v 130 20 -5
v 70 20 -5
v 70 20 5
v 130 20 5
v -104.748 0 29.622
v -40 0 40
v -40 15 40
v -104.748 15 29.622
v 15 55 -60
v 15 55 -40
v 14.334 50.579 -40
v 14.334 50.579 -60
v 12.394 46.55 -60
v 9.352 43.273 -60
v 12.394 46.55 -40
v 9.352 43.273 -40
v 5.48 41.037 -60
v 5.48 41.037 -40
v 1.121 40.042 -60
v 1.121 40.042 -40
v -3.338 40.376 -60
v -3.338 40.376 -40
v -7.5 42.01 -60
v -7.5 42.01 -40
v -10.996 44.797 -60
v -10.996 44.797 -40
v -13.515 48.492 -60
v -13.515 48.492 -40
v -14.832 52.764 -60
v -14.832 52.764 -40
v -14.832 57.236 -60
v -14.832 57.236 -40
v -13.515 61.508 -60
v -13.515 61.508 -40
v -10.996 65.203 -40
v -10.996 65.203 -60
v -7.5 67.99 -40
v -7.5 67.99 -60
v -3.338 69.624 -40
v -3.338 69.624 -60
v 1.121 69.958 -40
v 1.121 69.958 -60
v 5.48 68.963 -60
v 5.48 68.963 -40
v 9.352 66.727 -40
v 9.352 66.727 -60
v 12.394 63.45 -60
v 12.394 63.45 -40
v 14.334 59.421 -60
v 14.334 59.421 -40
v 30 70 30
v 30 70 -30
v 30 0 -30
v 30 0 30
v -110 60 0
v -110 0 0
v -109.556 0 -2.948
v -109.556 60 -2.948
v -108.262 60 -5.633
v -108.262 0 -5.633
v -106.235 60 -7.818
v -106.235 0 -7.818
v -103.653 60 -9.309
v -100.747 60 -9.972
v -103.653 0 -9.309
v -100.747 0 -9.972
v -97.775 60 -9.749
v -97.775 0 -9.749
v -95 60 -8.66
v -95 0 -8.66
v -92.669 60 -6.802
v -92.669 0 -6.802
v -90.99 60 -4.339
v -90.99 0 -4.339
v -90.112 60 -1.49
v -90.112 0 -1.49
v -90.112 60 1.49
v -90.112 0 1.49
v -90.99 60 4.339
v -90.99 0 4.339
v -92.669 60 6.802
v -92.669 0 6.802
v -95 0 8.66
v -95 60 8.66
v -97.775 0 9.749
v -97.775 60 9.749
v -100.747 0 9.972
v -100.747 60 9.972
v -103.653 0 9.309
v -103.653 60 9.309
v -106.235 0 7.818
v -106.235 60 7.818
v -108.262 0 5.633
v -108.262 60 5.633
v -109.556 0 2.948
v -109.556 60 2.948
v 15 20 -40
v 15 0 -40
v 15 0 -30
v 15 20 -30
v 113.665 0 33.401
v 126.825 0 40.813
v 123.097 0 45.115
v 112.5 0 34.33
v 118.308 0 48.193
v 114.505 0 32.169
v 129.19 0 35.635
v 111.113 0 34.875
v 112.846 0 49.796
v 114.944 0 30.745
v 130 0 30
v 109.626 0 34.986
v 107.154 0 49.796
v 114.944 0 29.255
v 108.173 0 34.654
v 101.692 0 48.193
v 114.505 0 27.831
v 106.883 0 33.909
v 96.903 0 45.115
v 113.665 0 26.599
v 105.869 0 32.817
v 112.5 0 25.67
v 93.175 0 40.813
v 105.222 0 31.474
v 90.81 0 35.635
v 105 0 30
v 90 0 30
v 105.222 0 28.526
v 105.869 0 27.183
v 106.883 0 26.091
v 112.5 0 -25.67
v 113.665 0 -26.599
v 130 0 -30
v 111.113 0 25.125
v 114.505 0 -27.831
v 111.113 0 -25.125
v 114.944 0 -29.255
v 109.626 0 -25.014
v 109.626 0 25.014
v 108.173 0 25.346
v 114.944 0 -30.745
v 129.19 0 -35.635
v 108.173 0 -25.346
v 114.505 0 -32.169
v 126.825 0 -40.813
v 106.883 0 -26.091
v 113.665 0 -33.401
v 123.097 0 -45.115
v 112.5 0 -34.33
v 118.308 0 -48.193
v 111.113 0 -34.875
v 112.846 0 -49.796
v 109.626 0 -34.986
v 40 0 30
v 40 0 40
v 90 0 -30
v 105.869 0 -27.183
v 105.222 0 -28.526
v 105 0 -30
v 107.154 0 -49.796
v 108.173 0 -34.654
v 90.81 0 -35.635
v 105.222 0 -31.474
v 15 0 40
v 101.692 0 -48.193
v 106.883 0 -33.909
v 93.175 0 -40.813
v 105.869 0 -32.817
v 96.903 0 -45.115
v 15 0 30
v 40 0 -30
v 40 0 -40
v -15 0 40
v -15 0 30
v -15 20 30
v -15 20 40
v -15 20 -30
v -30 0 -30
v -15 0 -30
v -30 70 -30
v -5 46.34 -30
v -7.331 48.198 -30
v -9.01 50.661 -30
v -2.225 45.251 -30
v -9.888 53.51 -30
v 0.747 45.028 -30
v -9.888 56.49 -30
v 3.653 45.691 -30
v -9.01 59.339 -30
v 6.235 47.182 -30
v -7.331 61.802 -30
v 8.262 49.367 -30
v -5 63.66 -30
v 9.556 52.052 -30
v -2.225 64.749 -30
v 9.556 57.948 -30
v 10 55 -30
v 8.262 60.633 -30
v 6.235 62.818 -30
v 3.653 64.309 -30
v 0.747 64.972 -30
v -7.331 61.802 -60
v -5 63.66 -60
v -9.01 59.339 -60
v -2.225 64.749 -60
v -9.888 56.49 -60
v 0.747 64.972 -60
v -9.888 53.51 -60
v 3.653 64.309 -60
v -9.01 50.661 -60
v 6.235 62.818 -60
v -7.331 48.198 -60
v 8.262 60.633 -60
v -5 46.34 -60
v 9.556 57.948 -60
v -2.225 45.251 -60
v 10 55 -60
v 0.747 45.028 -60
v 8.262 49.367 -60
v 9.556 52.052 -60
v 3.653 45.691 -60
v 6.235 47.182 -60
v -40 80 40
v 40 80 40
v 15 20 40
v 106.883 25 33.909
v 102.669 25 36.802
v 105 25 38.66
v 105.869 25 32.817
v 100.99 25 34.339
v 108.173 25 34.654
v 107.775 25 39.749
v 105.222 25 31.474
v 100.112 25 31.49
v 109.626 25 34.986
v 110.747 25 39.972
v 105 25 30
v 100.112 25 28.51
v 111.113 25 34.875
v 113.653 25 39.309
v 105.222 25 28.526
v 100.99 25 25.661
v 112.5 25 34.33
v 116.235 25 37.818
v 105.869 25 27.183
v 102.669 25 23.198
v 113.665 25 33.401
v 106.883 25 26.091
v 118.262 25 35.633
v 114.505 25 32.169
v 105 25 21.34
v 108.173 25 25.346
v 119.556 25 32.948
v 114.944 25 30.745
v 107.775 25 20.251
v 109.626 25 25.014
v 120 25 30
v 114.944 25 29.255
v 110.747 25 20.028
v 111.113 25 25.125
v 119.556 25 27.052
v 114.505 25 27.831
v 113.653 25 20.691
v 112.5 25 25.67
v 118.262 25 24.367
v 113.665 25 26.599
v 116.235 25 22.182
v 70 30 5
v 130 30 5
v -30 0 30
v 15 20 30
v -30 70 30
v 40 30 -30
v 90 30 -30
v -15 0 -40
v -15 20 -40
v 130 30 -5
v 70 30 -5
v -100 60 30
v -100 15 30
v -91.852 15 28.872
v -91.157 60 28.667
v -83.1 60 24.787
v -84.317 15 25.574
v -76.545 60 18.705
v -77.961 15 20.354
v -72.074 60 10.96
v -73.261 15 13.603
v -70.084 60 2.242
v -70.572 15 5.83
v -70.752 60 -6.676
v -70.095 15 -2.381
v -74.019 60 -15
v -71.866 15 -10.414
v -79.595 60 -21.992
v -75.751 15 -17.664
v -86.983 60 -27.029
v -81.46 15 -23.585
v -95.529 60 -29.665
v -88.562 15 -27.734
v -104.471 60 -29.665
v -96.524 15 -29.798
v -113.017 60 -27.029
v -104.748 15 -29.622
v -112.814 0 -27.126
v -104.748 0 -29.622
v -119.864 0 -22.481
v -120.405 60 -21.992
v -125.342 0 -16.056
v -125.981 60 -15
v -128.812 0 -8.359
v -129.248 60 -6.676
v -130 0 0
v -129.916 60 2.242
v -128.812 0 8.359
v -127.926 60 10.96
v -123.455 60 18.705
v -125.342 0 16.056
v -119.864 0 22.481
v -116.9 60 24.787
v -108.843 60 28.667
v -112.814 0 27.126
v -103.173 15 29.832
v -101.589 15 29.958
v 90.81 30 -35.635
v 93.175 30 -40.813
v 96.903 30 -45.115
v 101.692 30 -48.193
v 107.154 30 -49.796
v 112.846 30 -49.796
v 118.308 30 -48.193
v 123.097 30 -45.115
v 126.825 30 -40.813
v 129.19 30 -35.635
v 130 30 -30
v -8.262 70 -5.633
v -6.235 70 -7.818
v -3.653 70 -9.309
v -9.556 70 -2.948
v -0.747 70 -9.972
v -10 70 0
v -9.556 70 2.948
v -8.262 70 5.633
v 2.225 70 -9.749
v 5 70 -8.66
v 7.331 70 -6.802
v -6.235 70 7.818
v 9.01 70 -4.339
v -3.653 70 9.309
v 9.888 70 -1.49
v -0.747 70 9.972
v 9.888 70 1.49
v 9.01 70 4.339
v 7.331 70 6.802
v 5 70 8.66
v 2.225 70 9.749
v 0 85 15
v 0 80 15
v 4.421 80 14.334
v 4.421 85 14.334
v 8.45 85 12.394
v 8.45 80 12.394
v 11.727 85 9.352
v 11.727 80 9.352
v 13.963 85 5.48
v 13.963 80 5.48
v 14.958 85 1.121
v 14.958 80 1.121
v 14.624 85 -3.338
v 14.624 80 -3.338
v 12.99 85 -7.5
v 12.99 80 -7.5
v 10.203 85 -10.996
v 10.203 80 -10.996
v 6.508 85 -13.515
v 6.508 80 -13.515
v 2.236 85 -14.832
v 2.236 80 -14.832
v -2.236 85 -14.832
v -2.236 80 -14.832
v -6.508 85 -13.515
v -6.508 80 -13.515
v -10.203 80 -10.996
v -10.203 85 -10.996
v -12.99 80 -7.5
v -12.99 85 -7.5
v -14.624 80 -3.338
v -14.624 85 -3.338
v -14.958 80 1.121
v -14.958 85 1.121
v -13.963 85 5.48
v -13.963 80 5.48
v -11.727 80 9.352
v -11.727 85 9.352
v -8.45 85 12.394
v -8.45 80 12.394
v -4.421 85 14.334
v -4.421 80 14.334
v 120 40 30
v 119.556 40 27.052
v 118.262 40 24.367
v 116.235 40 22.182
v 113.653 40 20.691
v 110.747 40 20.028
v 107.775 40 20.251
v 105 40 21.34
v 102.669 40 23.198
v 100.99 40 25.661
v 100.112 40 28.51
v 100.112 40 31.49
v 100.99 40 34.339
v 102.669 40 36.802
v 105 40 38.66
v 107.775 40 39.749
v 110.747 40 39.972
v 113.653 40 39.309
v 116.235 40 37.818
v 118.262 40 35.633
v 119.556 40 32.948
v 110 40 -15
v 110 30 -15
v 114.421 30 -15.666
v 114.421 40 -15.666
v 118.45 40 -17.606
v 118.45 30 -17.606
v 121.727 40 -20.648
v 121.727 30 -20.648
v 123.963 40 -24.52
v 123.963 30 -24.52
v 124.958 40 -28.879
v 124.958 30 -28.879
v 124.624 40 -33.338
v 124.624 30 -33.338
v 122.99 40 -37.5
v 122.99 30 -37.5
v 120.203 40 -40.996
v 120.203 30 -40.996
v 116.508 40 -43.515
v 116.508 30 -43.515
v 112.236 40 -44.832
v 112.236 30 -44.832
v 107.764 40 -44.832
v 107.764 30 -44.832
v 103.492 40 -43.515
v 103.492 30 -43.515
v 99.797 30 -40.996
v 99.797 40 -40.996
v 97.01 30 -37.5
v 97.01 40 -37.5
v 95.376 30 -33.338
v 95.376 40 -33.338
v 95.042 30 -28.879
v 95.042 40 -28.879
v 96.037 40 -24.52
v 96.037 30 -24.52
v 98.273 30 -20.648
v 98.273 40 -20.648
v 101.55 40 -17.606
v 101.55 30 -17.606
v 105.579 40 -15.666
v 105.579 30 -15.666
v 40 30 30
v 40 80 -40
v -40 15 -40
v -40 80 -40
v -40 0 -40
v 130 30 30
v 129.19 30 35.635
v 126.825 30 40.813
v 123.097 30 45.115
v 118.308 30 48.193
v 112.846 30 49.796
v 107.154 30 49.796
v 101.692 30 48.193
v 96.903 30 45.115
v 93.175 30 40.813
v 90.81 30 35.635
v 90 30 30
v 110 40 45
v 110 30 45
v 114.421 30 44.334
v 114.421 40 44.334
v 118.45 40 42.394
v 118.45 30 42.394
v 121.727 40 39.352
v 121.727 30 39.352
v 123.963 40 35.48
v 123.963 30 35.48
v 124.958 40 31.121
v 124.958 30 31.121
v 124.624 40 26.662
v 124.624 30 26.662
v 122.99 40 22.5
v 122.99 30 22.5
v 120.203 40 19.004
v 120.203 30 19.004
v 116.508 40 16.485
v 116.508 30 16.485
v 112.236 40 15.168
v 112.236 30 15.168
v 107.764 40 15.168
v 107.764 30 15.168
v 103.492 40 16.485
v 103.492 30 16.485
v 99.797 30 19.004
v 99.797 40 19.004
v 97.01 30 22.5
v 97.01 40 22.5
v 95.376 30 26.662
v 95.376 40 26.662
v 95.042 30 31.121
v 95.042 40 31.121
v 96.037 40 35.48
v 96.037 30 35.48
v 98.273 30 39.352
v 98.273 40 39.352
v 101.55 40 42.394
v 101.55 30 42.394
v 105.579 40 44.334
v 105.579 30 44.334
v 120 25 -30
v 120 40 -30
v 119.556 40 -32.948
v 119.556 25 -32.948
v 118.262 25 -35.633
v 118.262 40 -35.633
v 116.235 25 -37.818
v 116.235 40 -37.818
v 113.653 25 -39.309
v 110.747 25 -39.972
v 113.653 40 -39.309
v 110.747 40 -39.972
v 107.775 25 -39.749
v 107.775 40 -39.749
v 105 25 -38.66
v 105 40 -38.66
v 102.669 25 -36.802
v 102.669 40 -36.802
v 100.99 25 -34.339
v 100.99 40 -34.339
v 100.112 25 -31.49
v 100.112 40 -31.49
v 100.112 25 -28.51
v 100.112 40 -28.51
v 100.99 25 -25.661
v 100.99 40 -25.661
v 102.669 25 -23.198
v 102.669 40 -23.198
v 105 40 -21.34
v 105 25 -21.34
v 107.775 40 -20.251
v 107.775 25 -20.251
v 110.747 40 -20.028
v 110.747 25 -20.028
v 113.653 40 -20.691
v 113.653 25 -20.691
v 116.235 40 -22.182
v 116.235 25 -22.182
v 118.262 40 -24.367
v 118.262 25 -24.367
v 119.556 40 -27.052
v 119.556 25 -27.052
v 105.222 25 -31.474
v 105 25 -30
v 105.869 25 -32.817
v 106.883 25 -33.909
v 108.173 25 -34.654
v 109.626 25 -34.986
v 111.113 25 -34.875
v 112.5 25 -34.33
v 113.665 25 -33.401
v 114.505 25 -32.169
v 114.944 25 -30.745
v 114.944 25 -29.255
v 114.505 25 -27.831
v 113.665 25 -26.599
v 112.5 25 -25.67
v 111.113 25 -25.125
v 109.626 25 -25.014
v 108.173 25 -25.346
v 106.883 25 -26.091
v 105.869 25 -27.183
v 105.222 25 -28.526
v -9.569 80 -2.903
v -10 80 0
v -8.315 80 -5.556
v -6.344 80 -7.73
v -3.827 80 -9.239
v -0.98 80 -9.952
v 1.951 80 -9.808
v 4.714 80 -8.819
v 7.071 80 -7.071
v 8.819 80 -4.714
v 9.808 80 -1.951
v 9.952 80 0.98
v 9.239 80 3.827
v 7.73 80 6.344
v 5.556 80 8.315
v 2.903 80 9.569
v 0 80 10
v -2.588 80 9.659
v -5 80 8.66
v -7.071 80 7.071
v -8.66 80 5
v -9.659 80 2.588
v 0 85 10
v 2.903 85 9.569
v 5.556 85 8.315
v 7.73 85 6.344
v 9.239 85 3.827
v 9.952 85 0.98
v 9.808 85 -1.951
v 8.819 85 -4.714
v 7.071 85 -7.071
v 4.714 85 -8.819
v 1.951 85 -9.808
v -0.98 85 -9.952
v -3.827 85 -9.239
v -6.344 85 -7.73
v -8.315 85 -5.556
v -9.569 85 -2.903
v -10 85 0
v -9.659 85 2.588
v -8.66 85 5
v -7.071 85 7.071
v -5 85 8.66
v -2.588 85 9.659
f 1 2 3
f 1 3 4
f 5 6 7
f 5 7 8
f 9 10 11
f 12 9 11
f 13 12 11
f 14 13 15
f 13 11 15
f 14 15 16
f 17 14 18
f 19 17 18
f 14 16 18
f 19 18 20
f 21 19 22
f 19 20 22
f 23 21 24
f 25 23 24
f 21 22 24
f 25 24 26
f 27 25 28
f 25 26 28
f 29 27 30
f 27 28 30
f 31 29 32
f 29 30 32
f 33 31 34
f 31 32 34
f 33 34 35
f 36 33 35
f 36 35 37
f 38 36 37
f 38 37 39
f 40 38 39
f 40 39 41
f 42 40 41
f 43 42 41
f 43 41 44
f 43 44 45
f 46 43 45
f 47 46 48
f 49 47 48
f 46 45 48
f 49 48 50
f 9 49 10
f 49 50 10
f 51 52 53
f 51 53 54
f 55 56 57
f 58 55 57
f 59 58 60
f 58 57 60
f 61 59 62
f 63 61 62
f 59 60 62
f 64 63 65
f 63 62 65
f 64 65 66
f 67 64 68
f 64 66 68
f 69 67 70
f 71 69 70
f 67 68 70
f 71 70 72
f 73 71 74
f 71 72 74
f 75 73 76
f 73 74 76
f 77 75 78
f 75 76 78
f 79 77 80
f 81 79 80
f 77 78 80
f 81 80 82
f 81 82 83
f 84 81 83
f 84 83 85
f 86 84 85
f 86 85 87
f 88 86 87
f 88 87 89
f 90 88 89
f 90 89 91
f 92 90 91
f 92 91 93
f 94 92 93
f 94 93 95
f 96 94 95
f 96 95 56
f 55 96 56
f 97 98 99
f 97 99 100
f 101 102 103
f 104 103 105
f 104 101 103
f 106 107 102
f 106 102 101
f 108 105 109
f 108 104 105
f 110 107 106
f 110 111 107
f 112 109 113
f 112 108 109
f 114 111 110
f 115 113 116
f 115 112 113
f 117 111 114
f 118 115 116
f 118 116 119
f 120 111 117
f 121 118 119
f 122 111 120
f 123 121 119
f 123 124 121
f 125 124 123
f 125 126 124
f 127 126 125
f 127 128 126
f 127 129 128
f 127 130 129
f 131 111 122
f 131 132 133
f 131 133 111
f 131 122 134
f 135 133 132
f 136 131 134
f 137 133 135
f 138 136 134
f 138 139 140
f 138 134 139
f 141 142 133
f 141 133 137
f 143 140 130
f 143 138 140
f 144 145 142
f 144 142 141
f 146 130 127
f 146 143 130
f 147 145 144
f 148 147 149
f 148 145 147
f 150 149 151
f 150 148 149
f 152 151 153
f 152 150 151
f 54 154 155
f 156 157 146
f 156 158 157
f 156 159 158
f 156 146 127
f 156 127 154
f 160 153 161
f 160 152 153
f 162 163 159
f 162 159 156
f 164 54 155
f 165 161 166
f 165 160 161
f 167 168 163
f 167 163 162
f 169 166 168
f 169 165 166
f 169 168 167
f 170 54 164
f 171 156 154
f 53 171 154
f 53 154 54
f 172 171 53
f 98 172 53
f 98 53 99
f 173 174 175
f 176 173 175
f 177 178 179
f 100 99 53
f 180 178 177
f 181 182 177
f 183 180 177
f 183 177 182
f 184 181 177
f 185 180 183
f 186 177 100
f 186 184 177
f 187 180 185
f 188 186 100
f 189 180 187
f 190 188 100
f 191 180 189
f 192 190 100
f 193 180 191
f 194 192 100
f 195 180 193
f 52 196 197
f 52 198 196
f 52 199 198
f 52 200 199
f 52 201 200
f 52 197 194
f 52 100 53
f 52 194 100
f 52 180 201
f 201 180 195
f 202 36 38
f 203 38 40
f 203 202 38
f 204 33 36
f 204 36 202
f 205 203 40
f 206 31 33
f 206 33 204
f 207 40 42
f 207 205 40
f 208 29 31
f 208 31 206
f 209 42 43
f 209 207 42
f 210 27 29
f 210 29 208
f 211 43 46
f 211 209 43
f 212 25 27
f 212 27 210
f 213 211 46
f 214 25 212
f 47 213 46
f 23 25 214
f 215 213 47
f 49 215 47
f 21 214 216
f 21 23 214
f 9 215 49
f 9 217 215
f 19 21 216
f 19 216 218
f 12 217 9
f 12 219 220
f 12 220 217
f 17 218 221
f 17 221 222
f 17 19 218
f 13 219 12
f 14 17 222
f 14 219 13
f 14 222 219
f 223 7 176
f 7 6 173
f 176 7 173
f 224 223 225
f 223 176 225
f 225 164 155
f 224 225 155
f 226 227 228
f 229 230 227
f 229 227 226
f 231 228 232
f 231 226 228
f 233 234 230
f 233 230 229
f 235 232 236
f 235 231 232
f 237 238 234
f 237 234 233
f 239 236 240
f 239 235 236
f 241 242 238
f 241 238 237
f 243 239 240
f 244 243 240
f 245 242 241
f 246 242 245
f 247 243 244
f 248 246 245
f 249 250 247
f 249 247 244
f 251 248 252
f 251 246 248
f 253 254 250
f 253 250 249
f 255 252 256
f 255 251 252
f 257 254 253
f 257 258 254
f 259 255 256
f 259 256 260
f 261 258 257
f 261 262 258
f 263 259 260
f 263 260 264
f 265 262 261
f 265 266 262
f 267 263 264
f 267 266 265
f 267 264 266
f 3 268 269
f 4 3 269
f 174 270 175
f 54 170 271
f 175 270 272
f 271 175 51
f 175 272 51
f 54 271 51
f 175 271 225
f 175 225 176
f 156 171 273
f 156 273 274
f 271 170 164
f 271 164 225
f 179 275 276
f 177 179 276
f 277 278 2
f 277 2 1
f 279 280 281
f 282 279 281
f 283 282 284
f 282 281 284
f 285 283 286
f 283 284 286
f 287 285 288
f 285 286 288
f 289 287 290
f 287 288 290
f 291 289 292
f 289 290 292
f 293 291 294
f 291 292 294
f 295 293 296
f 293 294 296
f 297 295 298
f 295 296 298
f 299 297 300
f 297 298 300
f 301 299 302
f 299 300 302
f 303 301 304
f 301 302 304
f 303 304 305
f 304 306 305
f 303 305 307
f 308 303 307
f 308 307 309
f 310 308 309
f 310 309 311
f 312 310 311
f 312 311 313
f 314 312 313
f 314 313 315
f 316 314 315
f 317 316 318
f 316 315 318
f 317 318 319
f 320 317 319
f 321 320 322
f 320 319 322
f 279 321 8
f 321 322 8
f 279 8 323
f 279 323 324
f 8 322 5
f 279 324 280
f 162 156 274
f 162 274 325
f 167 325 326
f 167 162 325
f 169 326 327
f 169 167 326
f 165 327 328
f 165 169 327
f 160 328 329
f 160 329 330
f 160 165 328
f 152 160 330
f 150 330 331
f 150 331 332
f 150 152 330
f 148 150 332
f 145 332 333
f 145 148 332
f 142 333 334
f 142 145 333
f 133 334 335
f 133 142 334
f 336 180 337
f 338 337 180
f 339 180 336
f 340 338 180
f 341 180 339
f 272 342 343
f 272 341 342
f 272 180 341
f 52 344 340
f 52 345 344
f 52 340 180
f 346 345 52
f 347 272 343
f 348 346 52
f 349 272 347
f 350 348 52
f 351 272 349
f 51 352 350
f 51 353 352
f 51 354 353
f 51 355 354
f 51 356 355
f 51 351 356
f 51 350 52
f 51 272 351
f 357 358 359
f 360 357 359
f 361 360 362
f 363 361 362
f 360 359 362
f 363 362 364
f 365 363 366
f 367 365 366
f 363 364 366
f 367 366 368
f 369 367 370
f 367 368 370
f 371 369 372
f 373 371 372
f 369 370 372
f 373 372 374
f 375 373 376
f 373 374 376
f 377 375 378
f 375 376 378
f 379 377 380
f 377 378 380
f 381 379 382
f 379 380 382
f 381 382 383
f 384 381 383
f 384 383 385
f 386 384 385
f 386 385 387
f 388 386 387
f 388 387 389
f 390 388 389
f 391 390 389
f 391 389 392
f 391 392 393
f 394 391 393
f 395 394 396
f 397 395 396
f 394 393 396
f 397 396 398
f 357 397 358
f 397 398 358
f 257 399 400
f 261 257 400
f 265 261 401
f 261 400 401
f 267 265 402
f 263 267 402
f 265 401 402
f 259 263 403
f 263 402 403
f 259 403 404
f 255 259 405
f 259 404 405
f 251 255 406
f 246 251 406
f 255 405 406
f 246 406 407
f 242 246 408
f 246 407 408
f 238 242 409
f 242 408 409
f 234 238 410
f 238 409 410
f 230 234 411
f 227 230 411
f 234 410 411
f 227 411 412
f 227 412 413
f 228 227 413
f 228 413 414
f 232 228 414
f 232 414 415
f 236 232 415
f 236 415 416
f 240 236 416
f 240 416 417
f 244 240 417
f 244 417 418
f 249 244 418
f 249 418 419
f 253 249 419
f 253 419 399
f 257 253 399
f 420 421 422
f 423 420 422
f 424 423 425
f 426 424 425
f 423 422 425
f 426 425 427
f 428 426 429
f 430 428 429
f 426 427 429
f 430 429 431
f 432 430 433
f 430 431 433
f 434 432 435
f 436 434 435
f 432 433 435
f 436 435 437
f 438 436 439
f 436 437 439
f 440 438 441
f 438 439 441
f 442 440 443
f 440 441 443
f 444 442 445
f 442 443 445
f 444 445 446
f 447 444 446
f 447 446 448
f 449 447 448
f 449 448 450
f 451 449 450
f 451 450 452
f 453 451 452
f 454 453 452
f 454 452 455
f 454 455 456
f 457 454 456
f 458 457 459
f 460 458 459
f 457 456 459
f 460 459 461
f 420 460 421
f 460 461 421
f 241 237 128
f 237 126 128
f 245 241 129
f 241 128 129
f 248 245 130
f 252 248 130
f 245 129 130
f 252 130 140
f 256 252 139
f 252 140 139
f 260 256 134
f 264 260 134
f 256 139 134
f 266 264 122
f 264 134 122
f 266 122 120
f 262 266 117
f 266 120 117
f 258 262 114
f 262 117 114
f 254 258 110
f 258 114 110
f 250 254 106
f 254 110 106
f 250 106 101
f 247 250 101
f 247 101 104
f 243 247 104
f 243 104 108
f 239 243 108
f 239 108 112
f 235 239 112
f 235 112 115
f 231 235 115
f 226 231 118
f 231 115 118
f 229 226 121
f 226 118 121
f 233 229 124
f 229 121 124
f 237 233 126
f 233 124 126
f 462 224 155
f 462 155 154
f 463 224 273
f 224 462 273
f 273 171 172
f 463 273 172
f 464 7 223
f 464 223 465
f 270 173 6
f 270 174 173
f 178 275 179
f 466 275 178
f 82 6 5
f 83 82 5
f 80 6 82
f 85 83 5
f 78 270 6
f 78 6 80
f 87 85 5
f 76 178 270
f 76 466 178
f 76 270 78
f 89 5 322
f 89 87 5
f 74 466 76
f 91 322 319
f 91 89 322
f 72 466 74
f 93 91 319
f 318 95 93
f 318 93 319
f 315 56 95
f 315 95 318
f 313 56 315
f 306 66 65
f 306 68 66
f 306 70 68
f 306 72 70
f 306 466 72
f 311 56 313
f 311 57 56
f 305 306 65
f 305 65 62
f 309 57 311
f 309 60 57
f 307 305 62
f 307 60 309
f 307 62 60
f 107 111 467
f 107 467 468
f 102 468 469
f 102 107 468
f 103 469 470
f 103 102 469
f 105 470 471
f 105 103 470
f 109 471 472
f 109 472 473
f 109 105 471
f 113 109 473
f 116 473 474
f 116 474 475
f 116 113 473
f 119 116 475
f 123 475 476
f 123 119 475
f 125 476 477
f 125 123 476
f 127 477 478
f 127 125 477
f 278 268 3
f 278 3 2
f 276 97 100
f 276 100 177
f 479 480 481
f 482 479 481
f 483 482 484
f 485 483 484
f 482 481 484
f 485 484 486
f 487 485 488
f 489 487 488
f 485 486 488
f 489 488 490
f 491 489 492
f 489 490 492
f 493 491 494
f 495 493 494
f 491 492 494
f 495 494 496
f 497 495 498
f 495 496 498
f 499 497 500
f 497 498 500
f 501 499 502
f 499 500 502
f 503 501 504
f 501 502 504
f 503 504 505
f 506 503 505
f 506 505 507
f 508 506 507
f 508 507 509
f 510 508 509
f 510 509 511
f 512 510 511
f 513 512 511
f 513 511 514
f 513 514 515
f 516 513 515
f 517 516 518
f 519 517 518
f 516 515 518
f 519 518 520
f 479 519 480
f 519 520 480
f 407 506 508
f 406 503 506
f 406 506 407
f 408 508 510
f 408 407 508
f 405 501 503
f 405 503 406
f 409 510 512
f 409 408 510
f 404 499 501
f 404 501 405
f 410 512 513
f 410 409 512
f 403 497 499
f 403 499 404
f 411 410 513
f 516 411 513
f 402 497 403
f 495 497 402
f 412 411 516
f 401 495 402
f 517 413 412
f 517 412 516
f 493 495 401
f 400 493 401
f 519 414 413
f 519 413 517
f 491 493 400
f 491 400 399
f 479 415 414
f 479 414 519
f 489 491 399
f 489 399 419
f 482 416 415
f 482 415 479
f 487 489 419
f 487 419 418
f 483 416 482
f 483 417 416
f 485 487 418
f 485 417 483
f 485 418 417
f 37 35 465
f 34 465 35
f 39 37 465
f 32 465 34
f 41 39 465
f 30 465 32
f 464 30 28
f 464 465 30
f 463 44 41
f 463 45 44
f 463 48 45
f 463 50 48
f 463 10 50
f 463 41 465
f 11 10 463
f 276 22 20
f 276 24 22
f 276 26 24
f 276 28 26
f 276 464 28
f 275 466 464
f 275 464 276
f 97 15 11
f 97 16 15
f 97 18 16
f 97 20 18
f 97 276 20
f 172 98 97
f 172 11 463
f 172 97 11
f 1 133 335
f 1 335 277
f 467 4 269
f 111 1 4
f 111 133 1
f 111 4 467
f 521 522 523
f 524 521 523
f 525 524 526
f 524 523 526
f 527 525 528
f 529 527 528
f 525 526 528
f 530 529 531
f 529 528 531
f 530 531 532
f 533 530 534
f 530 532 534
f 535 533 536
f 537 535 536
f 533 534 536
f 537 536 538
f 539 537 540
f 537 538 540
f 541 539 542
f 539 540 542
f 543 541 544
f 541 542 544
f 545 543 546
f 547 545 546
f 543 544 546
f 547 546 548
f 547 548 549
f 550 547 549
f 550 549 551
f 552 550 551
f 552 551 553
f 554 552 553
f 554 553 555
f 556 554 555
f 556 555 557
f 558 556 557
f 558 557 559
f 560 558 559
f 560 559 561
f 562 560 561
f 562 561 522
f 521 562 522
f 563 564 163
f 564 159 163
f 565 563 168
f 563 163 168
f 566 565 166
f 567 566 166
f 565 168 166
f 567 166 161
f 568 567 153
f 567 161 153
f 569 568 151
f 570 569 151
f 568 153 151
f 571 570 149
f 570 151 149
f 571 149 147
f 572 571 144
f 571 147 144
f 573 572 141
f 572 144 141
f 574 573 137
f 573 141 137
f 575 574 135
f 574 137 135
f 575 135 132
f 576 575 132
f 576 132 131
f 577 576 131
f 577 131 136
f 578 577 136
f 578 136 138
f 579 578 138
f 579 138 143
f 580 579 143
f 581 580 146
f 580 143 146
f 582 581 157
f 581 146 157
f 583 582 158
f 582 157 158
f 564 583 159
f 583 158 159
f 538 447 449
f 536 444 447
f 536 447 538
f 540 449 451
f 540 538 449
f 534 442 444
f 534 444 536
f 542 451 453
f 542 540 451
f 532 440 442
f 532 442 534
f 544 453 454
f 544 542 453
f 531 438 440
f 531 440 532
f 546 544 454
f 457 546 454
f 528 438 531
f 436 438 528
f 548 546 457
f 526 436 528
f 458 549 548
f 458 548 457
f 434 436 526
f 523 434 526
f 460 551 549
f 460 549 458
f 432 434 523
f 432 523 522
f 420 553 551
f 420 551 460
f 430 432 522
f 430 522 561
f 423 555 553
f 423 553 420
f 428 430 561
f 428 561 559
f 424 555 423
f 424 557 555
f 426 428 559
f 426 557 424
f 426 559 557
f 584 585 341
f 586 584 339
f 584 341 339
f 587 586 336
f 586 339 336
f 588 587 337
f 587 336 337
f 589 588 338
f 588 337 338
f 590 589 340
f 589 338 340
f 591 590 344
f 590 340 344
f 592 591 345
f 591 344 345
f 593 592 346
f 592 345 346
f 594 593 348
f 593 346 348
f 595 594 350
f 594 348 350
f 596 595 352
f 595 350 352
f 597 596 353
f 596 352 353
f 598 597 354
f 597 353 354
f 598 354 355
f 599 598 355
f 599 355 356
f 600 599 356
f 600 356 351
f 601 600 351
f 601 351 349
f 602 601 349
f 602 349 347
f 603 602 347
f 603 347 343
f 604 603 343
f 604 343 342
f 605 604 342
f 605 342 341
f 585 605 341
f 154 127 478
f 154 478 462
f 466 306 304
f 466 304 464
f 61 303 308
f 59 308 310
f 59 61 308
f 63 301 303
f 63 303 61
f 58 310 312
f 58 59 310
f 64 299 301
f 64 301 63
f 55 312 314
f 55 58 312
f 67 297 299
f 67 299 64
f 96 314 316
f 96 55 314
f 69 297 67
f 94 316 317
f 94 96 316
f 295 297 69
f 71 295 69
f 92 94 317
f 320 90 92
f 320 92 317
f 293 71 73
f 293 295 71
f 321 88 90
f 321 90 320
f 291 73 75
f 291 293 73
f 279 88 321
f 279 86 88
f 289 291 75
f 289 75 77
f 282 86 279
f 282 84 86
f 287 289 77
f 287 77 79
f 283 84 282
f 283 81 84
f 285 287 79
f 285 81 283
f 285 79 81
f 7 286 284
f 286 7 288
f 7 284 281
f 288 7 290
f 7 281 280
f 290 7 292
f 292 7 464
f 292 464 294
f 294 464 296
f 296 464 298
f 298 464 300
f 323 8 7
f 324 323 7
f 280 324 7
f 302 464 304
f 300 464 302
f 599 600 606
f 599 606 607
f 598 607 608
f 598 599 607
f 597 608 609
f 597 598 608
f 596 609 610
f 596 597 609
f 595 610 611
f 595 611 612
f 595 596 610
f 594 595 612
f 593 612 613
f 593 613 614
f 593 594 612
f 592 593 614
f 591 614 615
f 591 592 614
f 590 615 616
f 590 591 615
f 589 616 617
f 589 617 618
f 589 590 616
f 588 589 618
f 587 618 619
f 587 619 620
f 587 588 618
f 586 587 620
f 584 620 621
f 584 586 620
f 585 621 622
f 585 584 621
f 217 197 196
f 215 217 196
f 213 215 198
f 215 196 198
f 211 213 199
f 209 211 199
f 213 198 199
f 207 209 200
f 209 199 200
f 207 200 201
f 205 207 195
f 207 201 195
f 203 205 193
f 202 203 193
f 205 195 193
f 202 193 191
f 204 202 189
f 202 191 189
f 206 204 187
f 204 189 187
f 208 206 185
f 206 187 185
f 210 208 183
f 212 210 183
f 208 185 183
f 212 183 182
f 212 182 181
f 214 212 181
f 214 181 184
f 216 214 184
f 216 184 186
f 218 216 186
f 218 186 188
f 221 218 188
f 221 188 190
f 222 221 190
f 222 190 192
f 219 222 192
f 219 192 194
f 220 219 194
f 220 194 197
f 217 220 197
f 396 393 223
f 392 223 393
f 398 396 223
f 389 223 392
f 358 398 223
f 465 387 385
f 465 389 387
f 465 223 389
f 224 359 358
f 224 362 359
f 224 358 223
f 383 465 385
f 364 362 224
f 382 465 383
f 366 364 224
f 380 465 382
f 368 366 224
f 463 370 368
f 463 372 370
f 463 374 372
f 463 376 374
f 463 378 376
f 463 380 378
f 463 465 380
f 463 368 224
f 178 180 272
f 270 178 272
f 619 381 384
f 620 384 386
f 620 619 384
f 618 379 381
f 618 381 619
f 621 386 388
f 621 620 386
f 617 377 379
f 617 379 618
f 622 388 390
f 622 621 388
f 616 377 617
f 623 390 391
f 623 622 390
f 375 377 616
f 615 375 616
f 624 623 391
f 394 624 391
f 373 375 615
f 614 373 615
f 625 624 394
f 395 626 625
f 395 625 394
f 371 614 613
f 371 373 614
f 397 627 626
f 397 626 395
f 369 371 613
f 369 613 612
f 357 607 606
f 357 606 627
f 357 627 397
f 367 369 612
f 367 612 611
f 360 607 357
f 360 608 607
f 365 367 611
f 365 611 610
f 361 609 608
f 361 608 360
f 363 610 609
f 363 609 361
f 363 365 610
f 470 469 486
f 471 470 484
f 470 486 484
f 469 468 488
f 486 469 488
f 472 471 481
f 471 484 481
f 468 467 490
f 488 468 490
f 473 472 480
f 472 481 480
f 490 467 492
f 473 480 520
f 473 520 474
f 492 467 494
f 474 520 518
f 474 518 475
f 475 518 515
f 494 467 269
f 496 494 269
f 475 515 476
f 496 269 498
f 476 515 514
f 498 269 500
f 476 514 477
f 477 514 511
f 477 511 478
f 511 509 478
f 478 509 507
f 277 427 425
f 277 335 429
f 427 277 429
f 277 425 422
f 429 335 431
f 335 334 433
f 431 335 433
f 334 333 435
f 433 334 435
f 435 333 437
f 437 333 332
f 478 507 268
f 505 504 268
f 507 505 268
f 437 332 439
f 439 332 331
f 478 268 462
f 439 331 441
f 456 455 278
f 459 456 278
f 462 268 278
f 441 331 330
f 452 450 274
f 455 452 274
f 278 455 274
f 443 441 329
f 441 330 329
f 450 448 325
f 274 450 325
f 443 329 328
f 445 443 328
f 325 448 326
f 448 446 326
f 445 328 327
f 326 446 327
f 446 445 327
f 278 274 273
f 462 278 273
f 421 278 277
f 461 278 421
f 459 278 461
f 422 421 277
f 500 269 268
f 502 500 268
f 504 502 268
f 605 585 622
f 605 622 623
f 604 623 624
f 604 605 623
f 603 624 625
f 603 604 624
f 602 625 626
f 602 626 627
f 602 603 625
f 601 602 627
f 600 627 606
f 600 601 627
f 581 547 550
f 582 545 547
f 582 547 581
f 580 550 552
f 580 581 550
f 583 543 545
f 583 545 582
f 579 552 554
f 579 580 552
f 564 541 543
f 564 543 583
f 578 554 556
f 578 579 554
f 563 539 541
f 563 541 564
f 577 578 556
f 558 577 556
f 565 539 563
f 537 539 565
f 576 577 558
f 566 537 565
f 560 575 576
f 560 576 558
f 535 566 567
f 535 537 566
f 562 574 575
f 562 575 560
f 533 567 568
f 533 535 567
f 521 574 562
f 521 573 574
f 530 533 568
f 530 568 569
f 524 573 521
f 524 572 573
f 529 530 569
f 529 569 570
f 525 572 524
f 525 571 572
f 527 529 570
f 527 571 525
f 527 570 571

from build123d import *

# Parameters (mm, degrees)
SKETCH1_W               = 80
SKETCH1_H               = 80
BOSS_EXTRUDE1_DEPTH     = 80
CUT_EXTRUDE1_DEPTH      = 98.979589711
CUT_EXTRUDE1_DEPTH_BACK = 70
SKETCH2_W               = 60
SKETCH2_H               = 60
SKETCH3_R               = 15
SKETCH3_R_2             = 10
BOSS_EXTRUDE2_DEPTH     = 5
BOSS_EXTRUDE3_DEPTH     = 30
SKETCH5_R               = 15
BOSS_EXTRUDE4_DEPTH     = 10
HOLE1_D                 = 10
HOLE1_CBORE_D           = 20
HOLE1_CBORE_DEPTH       = 15
SKETCH8_W               = 60
SKETCH8_H               = 10
CUT_EXTRUDE2_DEPTH      = 10
SKETCH9_R               = 30
BOSS_EXTRUDE5_DEPTH     = 60
BOSS_EXTRUDE6_DEPTH     = 15
SKETCH11_W              = 30
SKETCH11_H              = 20
CUT_EXTRUDE3_DEPTH      = 180.51323071
SKETCH12_R              = 15
BOSS_EXTRUDE7_DEPTH     = 20
HOLE2_D                 = 20
HOLE3_D                 = 20
HOLE3_DEPTH             = 30
HOLE4_D                 = 20


with BuildPart() as part:
    # Sketch1 → Boss-Extrude1 (new body)
    with BuildSketch(Plane(origin=(0, 0, 0), x_dir=(1, 0, 0), z_dir=(0, 1, 0))):
        Rectangle(SKETCH1_W, SKETCH1_H)
    extrude(amount=BOSS_EXTRUDE1_DEPTH)

    # Sketch2 → Cut-Extrude1 (cut, two sides: drawn at the far end of the back side and taken through both)
    with BuildSketch(Plane.XZ.offset(-CUT_EXTRUDE1_DEPTH_BACK)):
        Rectangle(SKETCH2_W, SKETCH2_H)
    extrude(amount=CUT_EXTRUDE1_DEPTH + CUT_EXTRUDE1_DEPTH_BACK, mode=Mode.SUBTRACT)

    # Sketch3 → Boss-Extrude2 (add)
    with BuildSketch(Plane(origin=(0, 80, 0), x_dir=(1, 0, 0), z_dir=(0, 1, 0))):
        with Locations(Location((0, 0, 0), (0, 0, 270))):
            Circle(SKETCH3_R)
        with Locations(Location((0, 0, 0), (0, 0, 270))):
            Circle(SKETCH3_R_2, mode=Mode.SUBTRACT)
    extrude(amount=BOSS_EXTRUDE2_DEPTH)

    # Sketch4 → Boss-Extrude3 (add)
    with BuildSketch(Plane(origin=(0, 0, 0), x_dir=(1, 0, 0), z_dir=(0, 1, 0))):
        with BuildLine():
            Line((40, 30), (90, 30))
            ThreePointArc((90, 30), (110, 50), (130, 30))
            Line((130, 30), (130, -30))
            ThreePointArc((130, -30), (110, -50), (90, -30))
            Line((90, -30), (40, -30))
            Line((40, -30), (40, 30))
        make_face()
    extrude(amount=BOSS_EXTRUDE3_DEPTH)

    # Sketch5 → Boss-Extrude4 (add)
    with BuildSketch(Plane(origin=(0, 30, 0), x_dir=(1, 0, 0), z_dir=(0, 1, 0))):
        with Locations(Location((110, 30, 0), (0, 0, 270))):
            Circle(SKETCH5_R)
        with Locations(Location((110, -30, 0), (0, 0, 270))):
            Circle(SKETCH5_R)
    extrude(amount=BOSS_EXTRUDE4_DEPTH)

    # Hole1 (through all)
    with Locations(Plane(origin=(0, 40, 0), x_dir=(1, 0, 0), z_dir=(0, 1, 0))):
        with Locations((110, 30), (110, -30)):
            CounterBoreHole(HOLE1_D / 2, HOLE1_CBORE_D / 2, HOLE1_CBORE_DEPTH)

    # Sketch8 → Cut-Extrude2 (cut)
    with BuildSketch(Plane(origin=(0, 30, 0), x_dir=(1, 0, 0), z_dir=(0, 1, 0))):
        with Locations((100, 0)):
            Rectangle(SKETCH8_W, SKETCH8_H)
    extrude(amount=-CUT_EXTRUDE2_DEPTH, mode=Mode.SUBTRACT)



with BuildPart() as body_2:
    # Sketch9 → Boss-Extrude5 (new body)
    with BuildSketch(Plane(origin=(0, 0, 0), x_dir=(1, 0, 0), z_dir=(0, 1, 0))):
        with Locations(Location((-100, 0, 0), (0, 0, 270))):
            Circle(SKETCH9_R)
    extrude(amount=BOSS_EXTRUDE5_DEPTH)


with BuildPart() as part_1:
    add(part.part)

    add(body_2.part)  # Boss-Extrude6 merges body 2
    # Sketch10 → Boss-Extrude6 (add)
    with BuildSketch(Plane(origin=(0, 0, 0), x_dir=(1, 0, 0), z_dir=(0, 1, 0))):
        with BuildLine():
            Line((-40, 40), (-40, -40))
            Line((-40, -40), (-104.747935056, -29.621902584))
            ThreePointArc((-104.747935056, -29.621902584), (-70, 0), (-104.747935056, 29.621902584))
            Line((-104.747935056, 29.621902584), (-40, 40))
        make_face()
    extrude(amount=BOSS_EXTRUDE6_DEPTH)

    # Sketch11 → Cut-Extrude3 (cut, through all)
    with BuildSketch(Plane(origin=(0, 0, -40), x_dir=(-1, 0, 0), z_dir=(0, 0, -1))):
        with Locations((0, 10)):
            Rectangle(SKETCH11_W, SKETCH11_H)
    extrude(amount=-CUT_EXTRUDE3_DEPTH, mode=Mode.SUBTRACT)

    # Sketch12 → Boss-Extrude7 (add)
    with BuildSketch(Plane(origin=(0, 0, -40), x_dir=(-1, 0, 0), z_dir=(0, 0, -1))):
        with Locations(Location((0, 55, 0), (0, 0, 180))):
            Circle(SKETCH12_R)
    extrude(amount=BOSS_EXTRUDE7_DEPTH)

    # Hole2 (through all)
    with Locations(Plane(origin=(0, 80, 0), x_dir=(1, 0, 0), z_dir=(0, 1, 0))):
        with Locations((0, 0)):
            Hole(HOLE2_D / 2)

    # Hole3
    with Locations(Plane(origin=(0, 0, -60), x_dir=(-1, 0, 0), z_dir=(0, 0, -1))):
        with Locations((0, 55)):
            Hole(HOLE3_D / 2, depth=HOLE3_DEPTH)

    # Hole4 (through all)
    with Locations(Plane(origin=(0, 60, 0), x_dir=(1, 0, 0), z_dir=(0, 1, 0))):
        with Locations((-100, 0)):
            Hole(HOLE4_D / 2)


solid = part_1.part
